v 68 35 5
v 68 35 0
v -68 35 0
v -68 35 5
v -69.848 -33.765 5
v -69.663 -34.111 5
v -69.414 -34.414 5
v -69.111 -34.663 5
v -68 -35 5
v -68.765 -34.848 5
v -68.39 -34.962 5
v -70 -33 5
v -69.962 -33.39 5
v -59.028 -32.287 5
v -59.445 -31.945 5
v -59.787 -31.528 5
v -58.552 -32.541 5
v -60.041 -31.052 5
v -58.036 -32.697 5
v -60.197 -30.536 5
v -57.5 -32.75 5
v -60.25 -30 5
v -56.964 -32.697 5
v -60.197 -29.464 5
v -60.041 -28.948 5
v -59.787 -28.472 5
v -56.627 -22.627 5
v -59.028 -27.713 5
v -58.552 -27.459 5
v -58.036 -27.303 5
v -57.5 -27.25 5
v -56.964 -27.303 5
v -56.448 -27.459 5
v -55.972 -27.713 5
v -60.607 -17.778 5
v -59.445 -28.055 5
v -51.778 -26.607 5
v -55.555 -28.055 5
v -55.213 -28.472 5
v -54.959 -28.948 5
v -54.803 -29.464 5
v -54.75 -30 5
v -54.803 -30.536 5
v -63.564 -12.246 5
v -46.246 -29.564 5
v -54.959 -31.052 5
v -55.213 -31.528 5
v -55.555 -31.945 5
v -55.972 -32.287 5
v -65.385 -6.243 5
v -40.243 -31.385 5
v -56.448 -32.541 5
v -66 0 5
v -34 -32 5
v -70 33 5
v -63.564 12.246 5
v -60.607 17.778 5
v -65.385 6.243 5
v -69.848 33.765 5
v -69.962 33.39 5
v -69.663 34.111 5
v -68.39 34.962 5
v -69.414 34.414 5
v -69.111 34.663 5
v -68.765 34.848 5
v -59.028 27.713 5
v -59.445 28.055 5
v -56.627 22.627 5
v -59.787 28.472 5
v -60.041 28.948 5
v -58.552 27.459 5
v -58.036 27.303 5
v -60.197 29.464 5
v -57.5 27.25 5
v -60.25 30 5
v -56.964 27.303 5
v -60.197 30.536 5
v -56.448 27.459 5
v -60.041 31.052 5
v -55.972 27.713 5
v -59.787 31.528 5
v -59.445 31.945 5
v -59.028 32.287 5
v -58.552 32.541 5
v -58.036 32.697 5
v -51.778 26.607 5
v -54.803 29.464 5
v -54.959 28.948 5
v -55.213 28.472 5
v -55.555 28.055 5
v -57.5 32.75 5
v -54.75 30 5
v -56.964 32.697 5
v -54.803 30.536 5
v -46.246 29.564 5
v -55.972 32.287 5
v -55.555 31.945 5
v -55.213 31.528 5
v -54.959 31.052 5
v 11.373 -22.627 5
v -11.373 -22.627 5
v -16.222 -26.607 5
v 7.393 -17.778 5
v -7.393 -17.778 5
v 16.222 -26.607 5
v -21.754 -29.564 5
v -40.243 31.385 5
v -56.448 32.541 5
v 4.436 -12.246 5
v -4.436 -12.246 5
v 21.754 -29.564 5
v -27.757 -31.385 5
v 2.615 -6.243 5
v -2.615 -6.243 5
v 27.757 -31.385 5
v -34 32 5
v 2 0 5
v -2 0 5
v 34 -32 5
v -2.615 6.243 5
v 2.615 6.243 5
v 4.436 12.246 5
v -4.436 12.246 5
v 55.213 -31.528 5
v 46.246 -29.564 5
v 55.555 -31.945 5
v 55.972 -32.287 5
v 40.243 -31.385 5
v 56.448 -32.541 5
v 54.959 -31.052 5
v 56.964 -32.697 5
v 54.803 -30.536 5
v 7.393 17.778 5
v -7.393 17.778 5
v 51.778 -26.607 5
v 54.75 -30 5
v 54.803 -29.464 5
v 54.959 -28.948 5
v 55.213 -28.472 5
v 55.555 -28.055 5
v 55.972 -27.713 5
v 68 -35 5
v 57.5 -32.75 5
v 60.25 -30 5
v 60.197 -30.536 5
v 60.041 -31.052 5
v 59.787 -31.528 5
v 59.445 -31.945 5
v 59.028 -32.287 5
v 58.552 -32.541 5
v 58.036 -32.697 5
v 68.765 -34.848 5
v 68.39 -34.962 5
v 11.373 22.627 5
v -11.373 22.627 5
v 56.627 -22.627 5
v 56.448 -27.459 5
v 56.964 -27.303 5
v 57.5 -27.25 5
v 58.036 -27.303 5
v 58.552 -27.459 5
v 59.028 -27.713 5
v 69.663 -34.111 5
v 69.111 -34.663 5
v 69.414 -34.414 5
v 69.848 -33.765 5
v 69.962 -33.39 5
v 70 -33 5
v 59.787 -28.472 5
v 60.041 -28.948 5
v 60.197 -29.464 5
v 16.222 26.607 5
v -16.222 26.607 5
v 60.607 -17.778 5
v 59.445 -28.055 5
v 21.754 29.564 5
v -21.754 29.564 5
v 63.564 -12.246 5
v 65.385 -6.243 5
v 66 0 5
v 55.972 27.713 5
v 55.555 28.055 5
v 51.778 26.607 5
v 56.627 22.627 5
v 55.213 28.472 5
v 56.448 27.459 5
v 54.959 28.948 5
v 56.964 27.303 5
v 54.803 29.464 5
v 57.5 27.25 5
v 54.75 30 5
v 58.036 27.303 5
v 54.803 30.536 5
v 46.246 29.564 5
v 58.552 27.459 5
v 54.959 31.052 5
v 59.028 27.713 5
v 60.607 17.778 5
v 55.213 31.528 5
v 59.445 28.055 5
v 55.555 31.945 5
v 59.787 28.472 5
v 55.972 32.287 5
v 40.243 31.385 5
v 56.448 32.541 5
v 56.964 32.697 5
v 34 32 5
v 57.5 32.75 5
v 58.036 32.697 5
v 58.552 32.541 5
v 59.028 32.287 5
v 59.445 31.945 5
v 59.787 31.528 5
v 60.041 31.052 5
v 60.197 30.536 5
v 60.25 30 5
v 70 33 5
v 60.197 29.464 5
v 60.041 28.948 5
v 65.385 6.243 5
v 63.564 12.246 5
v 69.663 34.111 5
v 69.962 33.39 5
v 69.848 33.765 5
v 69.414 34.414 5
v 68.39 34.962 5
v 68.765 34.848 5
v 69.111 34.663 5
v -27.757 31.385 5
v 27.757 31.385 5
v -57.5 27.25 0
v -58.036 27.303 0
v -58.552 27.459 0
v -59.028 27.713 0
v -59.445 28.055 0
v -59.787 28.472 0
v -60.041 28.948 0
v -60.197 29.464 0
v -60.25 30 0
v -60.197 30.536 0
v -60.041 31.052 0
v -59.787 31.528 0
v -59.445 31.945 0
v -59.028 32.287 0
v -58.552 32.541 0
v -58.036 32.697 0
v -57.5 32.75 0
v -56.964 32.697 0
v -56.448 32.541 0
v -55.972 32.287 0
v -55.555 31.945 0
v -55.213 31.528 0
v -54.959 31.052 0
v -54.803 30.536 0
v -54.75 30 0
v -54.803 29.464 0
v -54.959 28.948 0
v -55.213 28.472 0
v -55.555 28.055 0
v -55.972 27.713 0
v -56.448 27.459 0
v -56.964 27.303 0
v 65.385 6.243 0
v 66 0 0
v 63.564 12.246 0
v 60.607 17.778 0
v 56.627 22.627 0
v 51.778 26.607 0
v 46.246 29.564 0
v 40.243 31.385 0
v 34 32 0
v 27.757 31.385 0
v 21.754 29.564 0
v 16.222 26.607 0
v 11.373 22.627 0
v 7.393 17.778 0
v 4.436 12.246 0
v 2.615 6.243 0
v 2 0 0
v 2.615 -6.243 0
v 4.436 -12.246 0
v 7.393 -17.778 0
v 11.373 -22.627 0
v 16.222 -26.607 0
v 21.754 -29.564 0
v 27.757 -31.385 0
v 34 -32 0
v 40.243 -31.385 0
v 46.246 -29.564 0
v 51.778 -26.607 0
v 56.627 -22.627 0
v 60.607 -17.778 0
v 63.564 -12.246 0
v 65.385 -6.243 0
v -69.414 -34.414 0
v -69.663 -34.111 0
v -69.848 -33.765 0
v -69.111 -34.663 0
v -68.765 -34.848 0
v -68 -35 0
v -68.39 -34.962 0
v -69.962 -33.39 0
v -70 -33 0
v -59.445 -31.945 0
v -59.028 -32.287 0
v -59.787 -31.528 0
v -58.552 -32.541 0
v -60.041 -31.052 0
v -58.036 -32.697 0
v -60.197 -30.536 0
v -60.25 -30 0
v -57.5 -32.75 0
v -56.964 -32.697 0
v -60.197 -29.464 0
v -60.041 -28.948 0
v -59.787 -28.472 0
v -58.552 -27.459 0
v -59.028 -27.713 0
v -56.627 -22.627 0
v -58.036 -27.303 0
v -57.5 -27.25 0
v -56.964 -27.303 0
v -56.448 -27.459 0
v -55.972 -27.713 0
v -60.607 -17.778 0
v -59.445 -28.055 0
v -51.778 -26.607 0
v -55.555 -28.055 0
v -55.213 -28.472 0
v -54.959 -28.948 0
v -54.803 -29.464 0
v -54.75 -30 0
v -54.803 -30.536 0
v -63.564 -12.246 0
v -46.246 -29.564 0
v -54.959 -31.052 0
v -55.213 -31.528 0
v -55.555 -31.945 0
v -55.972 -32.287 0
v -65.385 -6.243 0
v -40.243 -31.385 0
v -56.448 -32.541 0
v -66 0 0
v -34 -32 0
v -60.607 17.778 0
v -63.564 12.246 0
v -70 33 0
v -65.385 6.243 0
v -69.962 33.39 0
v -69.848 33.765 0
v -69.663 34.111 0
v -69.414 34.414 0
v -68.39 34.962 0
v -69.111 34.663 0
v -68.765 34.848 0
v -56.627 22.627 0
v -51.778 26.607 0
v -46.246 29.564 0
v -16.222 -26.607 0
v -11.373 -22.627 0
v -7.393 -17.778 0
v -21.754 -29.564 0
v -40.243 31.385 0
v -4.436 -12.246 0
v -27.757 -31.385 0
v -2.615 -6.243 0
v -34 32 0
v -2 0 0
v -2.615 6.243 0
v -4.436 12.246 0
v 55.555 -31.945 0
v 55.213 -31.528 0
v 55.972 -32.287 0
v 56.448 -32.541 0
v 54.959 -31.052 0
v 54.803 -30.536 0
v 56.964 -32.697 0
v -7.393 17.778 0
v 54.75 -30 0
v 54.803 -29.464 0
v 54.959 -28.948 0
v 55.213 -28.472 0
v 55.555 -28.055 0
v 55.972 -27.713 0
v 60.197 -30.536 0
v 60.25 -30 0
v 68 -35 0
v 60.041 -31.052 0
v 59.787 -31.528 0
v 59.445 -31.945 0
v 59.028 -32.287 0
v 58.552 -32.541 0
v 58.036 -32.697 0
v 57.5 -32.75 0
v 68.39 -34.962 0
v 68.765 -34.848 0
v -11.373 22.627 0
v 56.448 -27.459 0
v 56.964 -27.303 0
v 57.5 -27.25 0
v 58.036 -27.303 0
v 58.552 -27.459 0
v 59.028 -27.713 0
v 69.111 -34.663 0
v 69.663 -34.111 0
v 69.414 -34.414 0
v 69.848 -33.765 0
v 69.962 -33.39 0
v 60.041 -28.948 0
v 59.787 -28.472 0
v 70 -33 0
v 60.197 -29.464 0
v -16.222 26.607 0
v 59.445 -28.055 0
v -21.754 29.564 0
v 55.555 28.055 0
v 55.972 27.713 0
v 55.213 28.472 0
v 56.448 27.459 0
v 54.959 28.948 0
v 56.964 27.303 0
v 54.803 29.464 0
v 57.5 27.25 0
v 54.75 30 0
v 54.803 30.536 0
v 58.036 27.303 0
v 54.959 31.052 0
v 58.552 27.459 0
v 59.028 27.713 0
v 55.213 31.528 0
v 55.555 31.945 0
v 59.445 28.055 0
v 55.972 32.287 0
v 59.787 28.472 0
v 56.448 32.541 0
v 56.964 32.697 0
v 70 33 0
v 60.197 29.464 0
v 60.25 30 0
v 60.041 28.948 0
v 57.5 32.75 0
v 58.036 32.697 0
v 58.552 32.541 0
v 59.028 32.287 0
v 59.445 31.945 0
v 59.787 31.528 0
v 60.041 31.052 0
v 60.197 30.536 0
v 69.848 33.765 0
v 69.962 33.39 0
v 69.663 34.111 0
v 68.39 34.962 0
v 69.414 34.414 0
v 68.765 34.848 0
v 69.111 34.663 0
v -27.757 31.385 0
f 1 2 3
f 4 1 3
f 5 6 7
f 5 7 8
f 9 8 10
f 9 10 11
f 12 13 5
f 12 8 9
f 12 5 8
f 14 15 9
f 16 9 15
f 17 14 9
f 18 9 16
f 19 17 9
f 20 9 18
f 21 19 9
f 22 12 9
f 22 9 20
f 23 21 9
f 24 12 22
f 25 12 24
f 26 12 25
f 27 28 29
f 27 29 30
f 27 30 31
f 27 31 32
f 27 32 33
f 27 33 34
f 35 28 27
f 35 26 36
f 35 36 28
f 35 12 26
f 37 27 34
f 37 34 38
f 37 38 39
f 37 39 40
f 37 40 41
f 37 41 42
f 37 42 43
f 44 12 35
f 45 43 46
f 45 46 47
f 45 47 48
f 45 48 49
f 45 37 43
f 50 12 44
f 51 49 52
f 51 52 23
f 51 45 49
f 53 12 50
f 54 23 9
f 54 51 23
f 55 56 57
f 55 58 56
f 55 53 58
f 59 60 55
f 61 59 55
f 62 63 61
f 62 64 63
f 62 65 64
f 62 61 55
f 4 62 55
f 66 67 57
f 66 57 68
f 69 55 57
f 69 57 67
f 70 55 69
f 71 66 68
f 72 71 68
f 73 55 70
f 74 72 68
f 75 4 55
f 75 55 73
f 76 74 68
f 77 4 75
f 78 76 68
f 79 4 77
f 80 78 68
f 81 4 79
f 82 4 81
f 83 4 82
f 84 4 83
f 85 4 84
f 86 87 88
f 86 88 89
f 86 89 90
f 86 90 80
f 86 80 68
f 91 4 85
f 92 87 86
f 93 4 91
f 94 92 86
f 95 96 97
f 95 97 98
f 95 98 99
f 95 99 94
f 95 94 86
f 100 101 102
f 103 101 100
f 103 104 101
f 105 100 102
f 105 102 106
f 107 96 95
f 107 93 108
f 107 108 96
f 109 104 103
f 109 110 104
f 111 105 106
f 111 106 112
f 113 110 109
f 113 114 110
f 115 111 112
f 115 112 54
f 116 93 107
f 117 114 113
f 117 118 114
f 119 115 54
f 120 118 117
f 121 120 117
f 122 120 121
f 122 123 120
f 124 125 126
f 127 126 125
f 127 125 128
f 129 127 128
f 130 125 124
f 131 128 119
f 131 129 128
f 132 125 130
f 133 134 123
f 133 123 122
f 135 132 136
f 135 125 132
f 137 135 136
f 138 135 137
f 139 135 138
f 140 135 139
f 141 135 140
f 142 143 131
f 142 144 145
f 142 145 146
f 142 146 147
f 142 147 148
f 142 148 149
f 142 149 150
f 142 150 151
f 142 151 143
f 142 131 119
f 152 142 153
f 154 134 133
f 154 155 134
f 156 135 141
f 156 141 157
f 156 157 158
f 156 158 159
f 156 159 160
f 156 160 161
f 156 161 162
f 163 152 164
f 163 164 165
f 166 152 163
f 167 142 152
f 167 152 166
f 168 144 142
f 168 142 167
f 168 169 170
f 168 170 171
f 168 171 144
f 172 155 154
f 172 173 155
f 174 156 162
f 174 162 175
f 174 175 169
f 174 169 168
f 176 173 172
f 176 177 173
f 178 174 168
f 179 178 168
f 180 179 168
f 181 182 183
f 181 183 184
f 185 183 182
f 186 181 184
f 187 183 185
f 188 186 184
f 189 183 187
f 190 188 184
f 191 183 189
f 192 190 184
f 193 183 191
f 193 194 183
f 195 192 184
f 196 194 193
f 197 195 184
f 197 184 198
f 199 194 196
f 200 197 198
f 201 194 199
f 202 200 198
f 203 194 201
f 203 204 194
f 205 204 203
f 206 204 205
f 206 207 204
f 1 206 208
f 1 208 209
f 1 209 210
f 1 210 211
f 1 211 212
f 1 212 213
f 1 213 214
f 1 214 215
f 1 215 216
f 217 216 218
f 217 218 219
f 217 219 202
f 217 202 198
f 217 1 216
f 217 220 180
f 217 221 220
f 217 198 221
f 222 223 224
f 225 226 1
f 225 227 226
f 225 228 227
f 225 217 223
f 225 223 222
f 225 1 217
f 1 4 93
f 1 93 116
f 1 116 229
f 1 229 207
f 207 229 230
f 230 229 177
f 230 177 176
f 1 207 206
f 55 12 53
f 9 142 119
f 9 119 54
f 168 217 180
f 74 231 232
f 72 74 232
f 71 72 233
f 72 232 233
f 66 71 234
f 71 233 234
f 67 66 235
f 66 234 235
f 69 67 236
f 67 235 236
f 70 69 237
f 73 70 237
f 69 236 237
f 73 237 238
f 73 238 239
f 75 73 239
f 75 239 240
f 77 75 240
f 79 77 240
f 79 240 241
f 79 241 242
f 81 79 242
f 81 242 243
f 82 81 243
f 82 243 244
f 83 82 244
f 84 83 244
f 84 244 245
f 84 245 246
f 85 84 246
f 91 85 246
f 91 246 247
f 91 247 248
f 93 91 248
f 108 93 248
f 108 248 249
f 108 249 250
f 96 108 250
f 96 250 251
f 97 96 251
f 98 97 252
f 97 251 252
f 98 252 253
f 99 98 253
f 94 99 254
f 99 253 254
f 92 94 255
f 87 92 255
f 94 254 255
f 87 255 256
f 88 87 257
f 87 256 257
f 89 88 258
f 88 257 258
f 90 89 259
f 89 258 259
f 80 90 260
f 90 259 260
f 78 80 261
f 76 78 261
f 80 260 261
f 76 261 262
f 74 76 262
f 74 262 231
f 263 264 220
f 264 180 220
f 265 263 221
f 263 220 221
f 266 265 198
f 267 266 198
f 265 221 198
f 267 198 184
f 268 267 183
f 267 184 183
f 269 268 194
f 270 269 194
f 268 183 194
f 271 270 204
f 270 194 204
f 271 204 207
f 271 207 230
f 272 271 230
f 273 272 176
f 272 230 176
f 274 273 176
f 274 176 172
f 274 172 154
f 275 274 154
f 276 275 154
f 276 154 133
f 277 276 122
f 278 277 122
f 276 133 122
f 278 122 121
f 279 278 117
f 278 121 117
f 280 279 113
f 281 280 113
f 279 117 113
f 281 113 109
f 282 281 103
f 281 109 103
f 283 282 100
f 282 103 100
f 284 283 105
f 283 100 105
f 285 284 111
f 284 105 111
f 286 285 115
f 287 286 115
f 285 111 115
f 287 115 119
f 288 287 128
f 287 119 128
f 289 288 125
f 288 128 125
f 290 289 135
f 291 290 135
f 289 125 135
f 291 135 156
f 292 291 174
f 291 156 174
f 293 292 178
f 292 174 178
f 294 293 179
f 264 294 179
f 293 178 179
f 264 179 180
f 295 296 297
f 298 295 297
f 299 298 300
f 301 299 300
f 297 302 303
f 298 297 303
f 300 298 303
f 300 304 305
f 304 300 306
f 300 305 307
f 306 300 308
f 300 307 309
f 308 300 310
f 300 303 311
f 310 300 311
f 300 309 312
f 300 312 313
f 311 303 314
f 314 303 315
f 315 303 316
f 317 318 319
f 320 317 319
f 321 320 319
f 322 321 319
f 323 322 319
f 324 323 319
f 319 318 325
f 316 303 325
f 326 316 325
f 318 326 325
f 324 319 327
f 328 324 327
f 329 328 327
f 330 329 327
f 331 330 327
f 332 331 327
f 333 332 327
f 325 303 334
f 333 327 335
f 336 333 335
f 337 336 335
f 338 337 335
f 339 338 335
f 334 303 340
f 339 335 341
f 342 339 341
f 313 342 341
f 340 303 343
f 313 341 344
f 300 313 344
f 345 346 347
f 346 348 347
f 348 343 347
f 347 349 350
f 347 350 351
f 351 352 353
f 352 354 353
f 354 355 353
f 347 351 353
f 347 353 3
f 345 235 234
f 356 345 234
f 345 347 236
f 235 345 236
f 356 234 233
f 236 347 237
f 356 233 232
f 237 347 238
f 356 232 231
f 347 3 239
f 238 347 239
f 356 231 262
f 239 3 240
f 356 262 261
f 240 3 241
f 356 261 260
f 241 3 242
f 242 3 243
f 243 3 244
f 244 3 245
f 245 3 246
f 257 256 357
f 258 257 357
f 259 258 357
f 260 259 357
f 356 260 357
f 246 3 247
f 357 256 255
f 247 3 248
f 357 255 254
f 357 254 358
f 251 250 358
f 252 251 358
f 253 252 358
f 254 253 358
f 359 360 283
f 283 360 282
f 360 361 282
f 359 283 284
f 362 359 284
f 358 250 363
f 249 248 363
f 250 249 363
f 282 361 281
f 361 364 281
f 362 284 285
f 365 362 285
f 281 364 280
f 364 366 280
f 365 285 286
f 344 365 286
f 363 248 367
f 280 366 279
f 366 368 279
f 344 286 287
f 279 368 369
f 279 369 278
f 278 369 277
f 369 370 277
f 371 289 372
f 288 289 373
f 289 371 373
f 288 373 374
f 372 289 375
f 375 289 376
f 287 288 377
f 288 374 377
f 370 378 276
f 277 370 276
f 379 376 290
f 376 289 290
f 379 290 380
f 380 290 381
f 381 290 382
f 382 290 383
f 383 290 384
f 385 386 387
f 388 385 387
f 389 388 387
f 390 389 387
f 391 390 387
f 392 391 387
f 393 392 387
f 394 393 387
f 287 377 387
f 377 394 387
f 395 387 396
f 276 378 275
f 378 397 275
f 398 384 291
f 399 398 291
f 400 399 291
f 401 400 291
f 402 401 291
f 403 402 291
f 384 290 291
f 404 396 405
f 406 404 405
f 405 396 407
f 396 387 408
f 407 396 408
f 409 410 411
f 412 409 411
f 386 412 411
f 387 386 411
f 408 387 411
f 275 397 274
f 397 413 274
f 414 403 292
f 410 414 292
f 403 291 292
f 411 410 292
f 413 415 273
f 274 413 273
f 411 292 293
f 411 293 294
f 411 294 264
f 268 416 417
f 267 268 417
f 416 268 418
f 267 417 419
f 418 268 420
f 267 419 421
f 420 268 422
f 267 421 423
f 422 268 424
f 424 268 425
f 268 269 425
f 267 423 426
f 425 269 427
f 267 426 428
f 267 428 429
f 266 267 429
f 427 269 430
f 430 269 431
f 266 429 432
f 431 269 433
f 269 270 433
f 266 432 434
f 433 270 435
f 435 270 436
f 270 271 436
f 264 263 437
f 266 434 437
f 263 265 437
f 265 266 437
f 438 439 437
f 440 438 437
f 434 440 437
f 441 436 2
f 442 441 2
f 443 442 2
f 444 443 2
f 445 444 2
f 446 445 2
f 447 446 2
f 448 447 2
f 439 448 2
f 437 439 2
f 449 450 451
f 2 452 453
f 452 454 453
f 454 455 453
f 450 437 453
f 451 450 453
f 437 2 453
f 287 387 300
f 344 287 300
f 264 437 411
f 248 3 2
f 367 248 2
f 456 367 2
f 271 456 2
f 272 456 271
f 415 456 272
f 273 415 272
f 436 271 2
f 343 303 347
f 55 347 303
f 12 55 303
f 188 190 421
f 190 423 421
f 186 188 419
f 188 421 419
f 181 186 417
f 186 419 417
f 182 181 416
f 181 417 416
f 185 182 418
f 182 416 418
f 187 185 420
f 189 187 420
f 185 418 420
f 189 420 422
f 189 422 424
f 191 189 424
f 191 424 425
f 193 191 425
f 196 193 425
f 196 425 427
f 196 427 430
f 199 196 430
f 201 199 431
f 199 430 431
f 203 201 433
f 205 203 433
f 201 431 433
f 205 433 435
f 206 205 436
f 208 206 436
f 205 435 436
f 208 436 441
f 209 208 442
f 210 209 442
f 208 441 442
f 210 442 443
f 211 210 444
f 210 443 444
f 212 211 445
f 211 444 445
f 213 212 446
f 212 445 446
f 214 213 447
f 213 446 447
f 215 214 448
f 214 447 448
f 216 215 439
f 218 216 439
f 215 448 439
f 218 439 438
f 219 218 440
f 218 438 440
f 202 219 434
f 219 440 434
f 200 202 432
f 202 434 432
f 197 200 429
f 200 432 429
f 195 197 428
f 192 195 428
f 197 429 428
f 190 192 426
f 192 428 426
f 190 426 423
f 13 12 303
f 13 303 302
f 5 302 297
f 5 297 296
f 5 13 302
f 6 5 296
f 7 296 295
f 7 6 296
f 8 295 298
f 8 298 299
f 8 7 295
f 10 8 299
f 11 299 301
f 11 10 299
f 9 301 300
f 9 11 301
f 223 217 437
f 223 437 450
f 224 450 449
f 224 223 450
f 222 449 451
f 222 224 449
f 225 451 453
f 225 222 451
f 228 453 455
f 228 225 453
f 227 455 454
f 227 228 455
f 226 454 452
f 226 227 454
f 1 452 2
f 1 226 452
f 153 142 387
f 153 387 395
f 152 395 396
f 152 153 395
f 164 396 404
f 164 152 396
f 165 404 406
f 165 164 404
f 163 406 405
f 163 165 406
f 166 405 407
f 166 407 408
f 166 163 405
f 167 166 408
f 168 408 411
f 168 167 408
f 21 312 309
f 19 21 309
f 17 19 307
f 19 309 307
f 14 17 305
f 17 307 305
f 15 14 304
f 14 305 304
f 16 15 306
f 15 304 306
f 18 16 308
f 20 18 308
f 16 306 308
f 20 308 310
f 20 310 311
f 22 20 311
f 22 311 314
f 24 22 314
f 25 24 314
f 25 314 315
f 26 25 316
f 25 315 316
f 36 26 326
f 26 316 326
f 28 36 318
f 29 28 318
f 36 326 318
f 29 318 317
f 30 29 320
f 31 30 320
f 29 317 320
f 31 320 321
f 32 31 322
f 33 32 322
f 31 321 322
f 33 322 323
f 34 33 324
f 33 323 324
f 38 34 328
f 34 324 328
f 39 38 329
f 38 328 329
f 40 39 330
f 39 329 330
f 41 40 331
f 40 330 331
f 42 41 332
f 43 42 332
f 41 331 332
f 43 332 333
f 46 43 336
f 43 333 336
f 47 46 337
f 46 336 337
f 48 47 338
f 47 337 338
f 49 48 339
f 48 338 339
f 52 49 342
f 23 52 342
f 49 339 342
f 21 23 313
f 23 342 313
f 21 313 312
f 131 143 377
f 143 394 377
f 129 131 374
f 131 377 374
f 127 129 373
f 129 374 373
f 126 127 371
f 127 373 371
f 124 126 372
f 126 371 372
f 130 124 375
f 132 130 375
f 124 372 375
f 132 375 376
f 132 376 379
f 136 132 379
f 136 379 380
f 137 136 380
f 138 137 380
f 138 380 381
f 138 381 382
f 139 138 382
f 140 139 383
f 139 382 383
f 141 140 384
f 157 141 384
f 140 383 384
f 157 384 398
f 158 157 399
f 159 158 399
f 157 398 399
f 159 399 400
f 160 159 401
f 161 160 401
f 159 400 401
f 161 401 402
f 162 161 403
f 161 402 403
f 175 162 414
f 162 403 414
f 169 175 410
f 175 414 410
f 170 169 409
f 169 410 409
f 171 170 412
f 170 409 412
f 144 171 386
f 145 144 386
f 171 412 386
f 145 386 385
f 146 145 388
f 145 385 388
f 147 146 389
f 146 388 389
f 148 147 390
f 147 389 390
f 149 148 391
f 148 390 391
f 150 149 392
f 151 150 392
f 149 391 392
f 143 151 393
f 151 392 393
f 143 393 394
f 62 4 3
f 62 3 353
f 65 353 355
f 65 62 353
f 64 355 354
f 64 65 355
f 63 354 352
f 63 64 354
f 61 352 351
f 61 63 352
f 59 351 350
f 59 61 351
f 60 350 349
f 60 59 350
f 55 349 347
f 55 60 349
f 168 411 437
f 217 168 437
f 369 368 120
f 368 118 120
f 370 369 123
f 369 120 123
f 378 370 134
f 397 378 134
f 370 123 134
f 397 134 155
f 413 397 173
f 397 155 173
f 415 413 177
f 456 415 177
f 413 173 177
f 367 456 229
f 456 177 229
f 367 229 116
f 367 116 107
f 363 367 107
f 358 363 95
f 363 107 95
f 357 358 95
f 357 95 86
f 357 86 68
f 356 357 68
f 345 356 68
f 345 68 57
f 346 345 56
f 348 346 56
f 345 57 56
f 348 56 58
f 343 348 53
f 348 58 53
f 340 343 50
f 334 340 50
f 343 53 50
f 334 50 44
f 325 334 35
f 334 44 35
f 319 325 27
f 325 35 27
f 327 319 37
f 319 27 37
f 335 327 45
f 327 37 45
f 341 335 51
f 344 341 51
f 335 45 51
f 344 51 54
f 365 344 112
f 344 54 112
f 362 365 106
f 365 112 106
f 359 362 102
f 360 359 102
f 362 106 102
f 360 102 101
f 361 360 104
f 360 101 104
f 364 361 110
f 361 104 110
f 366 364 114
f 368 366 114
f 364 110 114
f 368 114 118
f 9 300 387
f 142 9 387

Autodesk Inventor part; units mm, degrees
ref_plane "YZ Plane" through (0, 0, 0) normal (1, 0, 0) x (0, 1, 0)
ref_plane "XZ Plane" through (0, 0, 0) normal (0, 1, 0) x (-1, 0, 0)
ref_plane "XY Plane" through (0, 0, 0) normal (0, 0, 1) x (1, 0, 0)
sketch "Sketch1" plane through (0, 0, 0) normal (0, 0, 1) x (1, 0, 0)
  line L0 (-70, -35) -> (70, -35)
  line L1 (70, -35) -> (70, 35)
  line L2 (70, 35) -> (-70, 35)
  line L3 (-70, 35) -> (-70, -35)
  line L4 (-70, -35) -> (70, 35) construction
  line L5 (70, -35) -> (-70, 35) construction
  point P0 (0, 0)
  dimension "d0" = 140
  dimension "d1" = 70
extrude "Extrusion1" add sketch "Sketch1" along normal blind 5
sketch "Sketch2" plane through (0, 0, 5) normal (0, 0, 1) x (1, 0, 0)
  line L0 (-57.5, -30) -> (57.5, -30) construction
  line L1 (57.5, -30) -> (57.5, 30) construction
  line L2 (57.5, 30) -> (-57.5, 30) construction
  line L3 (-57.5, 30) -> (-57.5, -30) construction
  line L4 (-57.5, -30) -> (57.5, 30) construction
  line L5 (57.5, -30) -> (-57.5, 30) construction
  point P0 (0, 0)
  dimension "d4" = 115
  dimension "d5" = 60
hole "Hole1" at (-57.5, -30, 5) at (-57.5, 30, 5) at (57.5, 30, 5) at (57.5, -30, 5) direction (0, 0, -1) diameter 5.5 depth 8 tip angle 118 clearance for "Countersunk Flat Head Screw DIN EN ISO 2009" size "M5" standard "DIN"
fillet "Fillet1" radius 2 4 edges at (70, 35, 2.5) (70, -35, 2.5) (-70, 35, 2.5) (-70, -35, 2.5)
sketch "Sketch3" plane through (0, 0, 5) normal (0, 0, 1) x (1, 0, 0)
  circle A0 centre (-34, 0) radius 32
  circle A1 centre (34, 0) radius 32
  line L0 (-34, 0) -> (34, 0) construction
  point P0 (0, 0)
  point P1 (0, 0)
  dimension "d14" = 64
  dimension "d15" = 64
  dimension "d16" = 68
extrude "Extrusion2" cut sketch "Sketch3" against normal blind 5
properties part number "MidStück_Caps" material "Polycarbonate, Clear"
